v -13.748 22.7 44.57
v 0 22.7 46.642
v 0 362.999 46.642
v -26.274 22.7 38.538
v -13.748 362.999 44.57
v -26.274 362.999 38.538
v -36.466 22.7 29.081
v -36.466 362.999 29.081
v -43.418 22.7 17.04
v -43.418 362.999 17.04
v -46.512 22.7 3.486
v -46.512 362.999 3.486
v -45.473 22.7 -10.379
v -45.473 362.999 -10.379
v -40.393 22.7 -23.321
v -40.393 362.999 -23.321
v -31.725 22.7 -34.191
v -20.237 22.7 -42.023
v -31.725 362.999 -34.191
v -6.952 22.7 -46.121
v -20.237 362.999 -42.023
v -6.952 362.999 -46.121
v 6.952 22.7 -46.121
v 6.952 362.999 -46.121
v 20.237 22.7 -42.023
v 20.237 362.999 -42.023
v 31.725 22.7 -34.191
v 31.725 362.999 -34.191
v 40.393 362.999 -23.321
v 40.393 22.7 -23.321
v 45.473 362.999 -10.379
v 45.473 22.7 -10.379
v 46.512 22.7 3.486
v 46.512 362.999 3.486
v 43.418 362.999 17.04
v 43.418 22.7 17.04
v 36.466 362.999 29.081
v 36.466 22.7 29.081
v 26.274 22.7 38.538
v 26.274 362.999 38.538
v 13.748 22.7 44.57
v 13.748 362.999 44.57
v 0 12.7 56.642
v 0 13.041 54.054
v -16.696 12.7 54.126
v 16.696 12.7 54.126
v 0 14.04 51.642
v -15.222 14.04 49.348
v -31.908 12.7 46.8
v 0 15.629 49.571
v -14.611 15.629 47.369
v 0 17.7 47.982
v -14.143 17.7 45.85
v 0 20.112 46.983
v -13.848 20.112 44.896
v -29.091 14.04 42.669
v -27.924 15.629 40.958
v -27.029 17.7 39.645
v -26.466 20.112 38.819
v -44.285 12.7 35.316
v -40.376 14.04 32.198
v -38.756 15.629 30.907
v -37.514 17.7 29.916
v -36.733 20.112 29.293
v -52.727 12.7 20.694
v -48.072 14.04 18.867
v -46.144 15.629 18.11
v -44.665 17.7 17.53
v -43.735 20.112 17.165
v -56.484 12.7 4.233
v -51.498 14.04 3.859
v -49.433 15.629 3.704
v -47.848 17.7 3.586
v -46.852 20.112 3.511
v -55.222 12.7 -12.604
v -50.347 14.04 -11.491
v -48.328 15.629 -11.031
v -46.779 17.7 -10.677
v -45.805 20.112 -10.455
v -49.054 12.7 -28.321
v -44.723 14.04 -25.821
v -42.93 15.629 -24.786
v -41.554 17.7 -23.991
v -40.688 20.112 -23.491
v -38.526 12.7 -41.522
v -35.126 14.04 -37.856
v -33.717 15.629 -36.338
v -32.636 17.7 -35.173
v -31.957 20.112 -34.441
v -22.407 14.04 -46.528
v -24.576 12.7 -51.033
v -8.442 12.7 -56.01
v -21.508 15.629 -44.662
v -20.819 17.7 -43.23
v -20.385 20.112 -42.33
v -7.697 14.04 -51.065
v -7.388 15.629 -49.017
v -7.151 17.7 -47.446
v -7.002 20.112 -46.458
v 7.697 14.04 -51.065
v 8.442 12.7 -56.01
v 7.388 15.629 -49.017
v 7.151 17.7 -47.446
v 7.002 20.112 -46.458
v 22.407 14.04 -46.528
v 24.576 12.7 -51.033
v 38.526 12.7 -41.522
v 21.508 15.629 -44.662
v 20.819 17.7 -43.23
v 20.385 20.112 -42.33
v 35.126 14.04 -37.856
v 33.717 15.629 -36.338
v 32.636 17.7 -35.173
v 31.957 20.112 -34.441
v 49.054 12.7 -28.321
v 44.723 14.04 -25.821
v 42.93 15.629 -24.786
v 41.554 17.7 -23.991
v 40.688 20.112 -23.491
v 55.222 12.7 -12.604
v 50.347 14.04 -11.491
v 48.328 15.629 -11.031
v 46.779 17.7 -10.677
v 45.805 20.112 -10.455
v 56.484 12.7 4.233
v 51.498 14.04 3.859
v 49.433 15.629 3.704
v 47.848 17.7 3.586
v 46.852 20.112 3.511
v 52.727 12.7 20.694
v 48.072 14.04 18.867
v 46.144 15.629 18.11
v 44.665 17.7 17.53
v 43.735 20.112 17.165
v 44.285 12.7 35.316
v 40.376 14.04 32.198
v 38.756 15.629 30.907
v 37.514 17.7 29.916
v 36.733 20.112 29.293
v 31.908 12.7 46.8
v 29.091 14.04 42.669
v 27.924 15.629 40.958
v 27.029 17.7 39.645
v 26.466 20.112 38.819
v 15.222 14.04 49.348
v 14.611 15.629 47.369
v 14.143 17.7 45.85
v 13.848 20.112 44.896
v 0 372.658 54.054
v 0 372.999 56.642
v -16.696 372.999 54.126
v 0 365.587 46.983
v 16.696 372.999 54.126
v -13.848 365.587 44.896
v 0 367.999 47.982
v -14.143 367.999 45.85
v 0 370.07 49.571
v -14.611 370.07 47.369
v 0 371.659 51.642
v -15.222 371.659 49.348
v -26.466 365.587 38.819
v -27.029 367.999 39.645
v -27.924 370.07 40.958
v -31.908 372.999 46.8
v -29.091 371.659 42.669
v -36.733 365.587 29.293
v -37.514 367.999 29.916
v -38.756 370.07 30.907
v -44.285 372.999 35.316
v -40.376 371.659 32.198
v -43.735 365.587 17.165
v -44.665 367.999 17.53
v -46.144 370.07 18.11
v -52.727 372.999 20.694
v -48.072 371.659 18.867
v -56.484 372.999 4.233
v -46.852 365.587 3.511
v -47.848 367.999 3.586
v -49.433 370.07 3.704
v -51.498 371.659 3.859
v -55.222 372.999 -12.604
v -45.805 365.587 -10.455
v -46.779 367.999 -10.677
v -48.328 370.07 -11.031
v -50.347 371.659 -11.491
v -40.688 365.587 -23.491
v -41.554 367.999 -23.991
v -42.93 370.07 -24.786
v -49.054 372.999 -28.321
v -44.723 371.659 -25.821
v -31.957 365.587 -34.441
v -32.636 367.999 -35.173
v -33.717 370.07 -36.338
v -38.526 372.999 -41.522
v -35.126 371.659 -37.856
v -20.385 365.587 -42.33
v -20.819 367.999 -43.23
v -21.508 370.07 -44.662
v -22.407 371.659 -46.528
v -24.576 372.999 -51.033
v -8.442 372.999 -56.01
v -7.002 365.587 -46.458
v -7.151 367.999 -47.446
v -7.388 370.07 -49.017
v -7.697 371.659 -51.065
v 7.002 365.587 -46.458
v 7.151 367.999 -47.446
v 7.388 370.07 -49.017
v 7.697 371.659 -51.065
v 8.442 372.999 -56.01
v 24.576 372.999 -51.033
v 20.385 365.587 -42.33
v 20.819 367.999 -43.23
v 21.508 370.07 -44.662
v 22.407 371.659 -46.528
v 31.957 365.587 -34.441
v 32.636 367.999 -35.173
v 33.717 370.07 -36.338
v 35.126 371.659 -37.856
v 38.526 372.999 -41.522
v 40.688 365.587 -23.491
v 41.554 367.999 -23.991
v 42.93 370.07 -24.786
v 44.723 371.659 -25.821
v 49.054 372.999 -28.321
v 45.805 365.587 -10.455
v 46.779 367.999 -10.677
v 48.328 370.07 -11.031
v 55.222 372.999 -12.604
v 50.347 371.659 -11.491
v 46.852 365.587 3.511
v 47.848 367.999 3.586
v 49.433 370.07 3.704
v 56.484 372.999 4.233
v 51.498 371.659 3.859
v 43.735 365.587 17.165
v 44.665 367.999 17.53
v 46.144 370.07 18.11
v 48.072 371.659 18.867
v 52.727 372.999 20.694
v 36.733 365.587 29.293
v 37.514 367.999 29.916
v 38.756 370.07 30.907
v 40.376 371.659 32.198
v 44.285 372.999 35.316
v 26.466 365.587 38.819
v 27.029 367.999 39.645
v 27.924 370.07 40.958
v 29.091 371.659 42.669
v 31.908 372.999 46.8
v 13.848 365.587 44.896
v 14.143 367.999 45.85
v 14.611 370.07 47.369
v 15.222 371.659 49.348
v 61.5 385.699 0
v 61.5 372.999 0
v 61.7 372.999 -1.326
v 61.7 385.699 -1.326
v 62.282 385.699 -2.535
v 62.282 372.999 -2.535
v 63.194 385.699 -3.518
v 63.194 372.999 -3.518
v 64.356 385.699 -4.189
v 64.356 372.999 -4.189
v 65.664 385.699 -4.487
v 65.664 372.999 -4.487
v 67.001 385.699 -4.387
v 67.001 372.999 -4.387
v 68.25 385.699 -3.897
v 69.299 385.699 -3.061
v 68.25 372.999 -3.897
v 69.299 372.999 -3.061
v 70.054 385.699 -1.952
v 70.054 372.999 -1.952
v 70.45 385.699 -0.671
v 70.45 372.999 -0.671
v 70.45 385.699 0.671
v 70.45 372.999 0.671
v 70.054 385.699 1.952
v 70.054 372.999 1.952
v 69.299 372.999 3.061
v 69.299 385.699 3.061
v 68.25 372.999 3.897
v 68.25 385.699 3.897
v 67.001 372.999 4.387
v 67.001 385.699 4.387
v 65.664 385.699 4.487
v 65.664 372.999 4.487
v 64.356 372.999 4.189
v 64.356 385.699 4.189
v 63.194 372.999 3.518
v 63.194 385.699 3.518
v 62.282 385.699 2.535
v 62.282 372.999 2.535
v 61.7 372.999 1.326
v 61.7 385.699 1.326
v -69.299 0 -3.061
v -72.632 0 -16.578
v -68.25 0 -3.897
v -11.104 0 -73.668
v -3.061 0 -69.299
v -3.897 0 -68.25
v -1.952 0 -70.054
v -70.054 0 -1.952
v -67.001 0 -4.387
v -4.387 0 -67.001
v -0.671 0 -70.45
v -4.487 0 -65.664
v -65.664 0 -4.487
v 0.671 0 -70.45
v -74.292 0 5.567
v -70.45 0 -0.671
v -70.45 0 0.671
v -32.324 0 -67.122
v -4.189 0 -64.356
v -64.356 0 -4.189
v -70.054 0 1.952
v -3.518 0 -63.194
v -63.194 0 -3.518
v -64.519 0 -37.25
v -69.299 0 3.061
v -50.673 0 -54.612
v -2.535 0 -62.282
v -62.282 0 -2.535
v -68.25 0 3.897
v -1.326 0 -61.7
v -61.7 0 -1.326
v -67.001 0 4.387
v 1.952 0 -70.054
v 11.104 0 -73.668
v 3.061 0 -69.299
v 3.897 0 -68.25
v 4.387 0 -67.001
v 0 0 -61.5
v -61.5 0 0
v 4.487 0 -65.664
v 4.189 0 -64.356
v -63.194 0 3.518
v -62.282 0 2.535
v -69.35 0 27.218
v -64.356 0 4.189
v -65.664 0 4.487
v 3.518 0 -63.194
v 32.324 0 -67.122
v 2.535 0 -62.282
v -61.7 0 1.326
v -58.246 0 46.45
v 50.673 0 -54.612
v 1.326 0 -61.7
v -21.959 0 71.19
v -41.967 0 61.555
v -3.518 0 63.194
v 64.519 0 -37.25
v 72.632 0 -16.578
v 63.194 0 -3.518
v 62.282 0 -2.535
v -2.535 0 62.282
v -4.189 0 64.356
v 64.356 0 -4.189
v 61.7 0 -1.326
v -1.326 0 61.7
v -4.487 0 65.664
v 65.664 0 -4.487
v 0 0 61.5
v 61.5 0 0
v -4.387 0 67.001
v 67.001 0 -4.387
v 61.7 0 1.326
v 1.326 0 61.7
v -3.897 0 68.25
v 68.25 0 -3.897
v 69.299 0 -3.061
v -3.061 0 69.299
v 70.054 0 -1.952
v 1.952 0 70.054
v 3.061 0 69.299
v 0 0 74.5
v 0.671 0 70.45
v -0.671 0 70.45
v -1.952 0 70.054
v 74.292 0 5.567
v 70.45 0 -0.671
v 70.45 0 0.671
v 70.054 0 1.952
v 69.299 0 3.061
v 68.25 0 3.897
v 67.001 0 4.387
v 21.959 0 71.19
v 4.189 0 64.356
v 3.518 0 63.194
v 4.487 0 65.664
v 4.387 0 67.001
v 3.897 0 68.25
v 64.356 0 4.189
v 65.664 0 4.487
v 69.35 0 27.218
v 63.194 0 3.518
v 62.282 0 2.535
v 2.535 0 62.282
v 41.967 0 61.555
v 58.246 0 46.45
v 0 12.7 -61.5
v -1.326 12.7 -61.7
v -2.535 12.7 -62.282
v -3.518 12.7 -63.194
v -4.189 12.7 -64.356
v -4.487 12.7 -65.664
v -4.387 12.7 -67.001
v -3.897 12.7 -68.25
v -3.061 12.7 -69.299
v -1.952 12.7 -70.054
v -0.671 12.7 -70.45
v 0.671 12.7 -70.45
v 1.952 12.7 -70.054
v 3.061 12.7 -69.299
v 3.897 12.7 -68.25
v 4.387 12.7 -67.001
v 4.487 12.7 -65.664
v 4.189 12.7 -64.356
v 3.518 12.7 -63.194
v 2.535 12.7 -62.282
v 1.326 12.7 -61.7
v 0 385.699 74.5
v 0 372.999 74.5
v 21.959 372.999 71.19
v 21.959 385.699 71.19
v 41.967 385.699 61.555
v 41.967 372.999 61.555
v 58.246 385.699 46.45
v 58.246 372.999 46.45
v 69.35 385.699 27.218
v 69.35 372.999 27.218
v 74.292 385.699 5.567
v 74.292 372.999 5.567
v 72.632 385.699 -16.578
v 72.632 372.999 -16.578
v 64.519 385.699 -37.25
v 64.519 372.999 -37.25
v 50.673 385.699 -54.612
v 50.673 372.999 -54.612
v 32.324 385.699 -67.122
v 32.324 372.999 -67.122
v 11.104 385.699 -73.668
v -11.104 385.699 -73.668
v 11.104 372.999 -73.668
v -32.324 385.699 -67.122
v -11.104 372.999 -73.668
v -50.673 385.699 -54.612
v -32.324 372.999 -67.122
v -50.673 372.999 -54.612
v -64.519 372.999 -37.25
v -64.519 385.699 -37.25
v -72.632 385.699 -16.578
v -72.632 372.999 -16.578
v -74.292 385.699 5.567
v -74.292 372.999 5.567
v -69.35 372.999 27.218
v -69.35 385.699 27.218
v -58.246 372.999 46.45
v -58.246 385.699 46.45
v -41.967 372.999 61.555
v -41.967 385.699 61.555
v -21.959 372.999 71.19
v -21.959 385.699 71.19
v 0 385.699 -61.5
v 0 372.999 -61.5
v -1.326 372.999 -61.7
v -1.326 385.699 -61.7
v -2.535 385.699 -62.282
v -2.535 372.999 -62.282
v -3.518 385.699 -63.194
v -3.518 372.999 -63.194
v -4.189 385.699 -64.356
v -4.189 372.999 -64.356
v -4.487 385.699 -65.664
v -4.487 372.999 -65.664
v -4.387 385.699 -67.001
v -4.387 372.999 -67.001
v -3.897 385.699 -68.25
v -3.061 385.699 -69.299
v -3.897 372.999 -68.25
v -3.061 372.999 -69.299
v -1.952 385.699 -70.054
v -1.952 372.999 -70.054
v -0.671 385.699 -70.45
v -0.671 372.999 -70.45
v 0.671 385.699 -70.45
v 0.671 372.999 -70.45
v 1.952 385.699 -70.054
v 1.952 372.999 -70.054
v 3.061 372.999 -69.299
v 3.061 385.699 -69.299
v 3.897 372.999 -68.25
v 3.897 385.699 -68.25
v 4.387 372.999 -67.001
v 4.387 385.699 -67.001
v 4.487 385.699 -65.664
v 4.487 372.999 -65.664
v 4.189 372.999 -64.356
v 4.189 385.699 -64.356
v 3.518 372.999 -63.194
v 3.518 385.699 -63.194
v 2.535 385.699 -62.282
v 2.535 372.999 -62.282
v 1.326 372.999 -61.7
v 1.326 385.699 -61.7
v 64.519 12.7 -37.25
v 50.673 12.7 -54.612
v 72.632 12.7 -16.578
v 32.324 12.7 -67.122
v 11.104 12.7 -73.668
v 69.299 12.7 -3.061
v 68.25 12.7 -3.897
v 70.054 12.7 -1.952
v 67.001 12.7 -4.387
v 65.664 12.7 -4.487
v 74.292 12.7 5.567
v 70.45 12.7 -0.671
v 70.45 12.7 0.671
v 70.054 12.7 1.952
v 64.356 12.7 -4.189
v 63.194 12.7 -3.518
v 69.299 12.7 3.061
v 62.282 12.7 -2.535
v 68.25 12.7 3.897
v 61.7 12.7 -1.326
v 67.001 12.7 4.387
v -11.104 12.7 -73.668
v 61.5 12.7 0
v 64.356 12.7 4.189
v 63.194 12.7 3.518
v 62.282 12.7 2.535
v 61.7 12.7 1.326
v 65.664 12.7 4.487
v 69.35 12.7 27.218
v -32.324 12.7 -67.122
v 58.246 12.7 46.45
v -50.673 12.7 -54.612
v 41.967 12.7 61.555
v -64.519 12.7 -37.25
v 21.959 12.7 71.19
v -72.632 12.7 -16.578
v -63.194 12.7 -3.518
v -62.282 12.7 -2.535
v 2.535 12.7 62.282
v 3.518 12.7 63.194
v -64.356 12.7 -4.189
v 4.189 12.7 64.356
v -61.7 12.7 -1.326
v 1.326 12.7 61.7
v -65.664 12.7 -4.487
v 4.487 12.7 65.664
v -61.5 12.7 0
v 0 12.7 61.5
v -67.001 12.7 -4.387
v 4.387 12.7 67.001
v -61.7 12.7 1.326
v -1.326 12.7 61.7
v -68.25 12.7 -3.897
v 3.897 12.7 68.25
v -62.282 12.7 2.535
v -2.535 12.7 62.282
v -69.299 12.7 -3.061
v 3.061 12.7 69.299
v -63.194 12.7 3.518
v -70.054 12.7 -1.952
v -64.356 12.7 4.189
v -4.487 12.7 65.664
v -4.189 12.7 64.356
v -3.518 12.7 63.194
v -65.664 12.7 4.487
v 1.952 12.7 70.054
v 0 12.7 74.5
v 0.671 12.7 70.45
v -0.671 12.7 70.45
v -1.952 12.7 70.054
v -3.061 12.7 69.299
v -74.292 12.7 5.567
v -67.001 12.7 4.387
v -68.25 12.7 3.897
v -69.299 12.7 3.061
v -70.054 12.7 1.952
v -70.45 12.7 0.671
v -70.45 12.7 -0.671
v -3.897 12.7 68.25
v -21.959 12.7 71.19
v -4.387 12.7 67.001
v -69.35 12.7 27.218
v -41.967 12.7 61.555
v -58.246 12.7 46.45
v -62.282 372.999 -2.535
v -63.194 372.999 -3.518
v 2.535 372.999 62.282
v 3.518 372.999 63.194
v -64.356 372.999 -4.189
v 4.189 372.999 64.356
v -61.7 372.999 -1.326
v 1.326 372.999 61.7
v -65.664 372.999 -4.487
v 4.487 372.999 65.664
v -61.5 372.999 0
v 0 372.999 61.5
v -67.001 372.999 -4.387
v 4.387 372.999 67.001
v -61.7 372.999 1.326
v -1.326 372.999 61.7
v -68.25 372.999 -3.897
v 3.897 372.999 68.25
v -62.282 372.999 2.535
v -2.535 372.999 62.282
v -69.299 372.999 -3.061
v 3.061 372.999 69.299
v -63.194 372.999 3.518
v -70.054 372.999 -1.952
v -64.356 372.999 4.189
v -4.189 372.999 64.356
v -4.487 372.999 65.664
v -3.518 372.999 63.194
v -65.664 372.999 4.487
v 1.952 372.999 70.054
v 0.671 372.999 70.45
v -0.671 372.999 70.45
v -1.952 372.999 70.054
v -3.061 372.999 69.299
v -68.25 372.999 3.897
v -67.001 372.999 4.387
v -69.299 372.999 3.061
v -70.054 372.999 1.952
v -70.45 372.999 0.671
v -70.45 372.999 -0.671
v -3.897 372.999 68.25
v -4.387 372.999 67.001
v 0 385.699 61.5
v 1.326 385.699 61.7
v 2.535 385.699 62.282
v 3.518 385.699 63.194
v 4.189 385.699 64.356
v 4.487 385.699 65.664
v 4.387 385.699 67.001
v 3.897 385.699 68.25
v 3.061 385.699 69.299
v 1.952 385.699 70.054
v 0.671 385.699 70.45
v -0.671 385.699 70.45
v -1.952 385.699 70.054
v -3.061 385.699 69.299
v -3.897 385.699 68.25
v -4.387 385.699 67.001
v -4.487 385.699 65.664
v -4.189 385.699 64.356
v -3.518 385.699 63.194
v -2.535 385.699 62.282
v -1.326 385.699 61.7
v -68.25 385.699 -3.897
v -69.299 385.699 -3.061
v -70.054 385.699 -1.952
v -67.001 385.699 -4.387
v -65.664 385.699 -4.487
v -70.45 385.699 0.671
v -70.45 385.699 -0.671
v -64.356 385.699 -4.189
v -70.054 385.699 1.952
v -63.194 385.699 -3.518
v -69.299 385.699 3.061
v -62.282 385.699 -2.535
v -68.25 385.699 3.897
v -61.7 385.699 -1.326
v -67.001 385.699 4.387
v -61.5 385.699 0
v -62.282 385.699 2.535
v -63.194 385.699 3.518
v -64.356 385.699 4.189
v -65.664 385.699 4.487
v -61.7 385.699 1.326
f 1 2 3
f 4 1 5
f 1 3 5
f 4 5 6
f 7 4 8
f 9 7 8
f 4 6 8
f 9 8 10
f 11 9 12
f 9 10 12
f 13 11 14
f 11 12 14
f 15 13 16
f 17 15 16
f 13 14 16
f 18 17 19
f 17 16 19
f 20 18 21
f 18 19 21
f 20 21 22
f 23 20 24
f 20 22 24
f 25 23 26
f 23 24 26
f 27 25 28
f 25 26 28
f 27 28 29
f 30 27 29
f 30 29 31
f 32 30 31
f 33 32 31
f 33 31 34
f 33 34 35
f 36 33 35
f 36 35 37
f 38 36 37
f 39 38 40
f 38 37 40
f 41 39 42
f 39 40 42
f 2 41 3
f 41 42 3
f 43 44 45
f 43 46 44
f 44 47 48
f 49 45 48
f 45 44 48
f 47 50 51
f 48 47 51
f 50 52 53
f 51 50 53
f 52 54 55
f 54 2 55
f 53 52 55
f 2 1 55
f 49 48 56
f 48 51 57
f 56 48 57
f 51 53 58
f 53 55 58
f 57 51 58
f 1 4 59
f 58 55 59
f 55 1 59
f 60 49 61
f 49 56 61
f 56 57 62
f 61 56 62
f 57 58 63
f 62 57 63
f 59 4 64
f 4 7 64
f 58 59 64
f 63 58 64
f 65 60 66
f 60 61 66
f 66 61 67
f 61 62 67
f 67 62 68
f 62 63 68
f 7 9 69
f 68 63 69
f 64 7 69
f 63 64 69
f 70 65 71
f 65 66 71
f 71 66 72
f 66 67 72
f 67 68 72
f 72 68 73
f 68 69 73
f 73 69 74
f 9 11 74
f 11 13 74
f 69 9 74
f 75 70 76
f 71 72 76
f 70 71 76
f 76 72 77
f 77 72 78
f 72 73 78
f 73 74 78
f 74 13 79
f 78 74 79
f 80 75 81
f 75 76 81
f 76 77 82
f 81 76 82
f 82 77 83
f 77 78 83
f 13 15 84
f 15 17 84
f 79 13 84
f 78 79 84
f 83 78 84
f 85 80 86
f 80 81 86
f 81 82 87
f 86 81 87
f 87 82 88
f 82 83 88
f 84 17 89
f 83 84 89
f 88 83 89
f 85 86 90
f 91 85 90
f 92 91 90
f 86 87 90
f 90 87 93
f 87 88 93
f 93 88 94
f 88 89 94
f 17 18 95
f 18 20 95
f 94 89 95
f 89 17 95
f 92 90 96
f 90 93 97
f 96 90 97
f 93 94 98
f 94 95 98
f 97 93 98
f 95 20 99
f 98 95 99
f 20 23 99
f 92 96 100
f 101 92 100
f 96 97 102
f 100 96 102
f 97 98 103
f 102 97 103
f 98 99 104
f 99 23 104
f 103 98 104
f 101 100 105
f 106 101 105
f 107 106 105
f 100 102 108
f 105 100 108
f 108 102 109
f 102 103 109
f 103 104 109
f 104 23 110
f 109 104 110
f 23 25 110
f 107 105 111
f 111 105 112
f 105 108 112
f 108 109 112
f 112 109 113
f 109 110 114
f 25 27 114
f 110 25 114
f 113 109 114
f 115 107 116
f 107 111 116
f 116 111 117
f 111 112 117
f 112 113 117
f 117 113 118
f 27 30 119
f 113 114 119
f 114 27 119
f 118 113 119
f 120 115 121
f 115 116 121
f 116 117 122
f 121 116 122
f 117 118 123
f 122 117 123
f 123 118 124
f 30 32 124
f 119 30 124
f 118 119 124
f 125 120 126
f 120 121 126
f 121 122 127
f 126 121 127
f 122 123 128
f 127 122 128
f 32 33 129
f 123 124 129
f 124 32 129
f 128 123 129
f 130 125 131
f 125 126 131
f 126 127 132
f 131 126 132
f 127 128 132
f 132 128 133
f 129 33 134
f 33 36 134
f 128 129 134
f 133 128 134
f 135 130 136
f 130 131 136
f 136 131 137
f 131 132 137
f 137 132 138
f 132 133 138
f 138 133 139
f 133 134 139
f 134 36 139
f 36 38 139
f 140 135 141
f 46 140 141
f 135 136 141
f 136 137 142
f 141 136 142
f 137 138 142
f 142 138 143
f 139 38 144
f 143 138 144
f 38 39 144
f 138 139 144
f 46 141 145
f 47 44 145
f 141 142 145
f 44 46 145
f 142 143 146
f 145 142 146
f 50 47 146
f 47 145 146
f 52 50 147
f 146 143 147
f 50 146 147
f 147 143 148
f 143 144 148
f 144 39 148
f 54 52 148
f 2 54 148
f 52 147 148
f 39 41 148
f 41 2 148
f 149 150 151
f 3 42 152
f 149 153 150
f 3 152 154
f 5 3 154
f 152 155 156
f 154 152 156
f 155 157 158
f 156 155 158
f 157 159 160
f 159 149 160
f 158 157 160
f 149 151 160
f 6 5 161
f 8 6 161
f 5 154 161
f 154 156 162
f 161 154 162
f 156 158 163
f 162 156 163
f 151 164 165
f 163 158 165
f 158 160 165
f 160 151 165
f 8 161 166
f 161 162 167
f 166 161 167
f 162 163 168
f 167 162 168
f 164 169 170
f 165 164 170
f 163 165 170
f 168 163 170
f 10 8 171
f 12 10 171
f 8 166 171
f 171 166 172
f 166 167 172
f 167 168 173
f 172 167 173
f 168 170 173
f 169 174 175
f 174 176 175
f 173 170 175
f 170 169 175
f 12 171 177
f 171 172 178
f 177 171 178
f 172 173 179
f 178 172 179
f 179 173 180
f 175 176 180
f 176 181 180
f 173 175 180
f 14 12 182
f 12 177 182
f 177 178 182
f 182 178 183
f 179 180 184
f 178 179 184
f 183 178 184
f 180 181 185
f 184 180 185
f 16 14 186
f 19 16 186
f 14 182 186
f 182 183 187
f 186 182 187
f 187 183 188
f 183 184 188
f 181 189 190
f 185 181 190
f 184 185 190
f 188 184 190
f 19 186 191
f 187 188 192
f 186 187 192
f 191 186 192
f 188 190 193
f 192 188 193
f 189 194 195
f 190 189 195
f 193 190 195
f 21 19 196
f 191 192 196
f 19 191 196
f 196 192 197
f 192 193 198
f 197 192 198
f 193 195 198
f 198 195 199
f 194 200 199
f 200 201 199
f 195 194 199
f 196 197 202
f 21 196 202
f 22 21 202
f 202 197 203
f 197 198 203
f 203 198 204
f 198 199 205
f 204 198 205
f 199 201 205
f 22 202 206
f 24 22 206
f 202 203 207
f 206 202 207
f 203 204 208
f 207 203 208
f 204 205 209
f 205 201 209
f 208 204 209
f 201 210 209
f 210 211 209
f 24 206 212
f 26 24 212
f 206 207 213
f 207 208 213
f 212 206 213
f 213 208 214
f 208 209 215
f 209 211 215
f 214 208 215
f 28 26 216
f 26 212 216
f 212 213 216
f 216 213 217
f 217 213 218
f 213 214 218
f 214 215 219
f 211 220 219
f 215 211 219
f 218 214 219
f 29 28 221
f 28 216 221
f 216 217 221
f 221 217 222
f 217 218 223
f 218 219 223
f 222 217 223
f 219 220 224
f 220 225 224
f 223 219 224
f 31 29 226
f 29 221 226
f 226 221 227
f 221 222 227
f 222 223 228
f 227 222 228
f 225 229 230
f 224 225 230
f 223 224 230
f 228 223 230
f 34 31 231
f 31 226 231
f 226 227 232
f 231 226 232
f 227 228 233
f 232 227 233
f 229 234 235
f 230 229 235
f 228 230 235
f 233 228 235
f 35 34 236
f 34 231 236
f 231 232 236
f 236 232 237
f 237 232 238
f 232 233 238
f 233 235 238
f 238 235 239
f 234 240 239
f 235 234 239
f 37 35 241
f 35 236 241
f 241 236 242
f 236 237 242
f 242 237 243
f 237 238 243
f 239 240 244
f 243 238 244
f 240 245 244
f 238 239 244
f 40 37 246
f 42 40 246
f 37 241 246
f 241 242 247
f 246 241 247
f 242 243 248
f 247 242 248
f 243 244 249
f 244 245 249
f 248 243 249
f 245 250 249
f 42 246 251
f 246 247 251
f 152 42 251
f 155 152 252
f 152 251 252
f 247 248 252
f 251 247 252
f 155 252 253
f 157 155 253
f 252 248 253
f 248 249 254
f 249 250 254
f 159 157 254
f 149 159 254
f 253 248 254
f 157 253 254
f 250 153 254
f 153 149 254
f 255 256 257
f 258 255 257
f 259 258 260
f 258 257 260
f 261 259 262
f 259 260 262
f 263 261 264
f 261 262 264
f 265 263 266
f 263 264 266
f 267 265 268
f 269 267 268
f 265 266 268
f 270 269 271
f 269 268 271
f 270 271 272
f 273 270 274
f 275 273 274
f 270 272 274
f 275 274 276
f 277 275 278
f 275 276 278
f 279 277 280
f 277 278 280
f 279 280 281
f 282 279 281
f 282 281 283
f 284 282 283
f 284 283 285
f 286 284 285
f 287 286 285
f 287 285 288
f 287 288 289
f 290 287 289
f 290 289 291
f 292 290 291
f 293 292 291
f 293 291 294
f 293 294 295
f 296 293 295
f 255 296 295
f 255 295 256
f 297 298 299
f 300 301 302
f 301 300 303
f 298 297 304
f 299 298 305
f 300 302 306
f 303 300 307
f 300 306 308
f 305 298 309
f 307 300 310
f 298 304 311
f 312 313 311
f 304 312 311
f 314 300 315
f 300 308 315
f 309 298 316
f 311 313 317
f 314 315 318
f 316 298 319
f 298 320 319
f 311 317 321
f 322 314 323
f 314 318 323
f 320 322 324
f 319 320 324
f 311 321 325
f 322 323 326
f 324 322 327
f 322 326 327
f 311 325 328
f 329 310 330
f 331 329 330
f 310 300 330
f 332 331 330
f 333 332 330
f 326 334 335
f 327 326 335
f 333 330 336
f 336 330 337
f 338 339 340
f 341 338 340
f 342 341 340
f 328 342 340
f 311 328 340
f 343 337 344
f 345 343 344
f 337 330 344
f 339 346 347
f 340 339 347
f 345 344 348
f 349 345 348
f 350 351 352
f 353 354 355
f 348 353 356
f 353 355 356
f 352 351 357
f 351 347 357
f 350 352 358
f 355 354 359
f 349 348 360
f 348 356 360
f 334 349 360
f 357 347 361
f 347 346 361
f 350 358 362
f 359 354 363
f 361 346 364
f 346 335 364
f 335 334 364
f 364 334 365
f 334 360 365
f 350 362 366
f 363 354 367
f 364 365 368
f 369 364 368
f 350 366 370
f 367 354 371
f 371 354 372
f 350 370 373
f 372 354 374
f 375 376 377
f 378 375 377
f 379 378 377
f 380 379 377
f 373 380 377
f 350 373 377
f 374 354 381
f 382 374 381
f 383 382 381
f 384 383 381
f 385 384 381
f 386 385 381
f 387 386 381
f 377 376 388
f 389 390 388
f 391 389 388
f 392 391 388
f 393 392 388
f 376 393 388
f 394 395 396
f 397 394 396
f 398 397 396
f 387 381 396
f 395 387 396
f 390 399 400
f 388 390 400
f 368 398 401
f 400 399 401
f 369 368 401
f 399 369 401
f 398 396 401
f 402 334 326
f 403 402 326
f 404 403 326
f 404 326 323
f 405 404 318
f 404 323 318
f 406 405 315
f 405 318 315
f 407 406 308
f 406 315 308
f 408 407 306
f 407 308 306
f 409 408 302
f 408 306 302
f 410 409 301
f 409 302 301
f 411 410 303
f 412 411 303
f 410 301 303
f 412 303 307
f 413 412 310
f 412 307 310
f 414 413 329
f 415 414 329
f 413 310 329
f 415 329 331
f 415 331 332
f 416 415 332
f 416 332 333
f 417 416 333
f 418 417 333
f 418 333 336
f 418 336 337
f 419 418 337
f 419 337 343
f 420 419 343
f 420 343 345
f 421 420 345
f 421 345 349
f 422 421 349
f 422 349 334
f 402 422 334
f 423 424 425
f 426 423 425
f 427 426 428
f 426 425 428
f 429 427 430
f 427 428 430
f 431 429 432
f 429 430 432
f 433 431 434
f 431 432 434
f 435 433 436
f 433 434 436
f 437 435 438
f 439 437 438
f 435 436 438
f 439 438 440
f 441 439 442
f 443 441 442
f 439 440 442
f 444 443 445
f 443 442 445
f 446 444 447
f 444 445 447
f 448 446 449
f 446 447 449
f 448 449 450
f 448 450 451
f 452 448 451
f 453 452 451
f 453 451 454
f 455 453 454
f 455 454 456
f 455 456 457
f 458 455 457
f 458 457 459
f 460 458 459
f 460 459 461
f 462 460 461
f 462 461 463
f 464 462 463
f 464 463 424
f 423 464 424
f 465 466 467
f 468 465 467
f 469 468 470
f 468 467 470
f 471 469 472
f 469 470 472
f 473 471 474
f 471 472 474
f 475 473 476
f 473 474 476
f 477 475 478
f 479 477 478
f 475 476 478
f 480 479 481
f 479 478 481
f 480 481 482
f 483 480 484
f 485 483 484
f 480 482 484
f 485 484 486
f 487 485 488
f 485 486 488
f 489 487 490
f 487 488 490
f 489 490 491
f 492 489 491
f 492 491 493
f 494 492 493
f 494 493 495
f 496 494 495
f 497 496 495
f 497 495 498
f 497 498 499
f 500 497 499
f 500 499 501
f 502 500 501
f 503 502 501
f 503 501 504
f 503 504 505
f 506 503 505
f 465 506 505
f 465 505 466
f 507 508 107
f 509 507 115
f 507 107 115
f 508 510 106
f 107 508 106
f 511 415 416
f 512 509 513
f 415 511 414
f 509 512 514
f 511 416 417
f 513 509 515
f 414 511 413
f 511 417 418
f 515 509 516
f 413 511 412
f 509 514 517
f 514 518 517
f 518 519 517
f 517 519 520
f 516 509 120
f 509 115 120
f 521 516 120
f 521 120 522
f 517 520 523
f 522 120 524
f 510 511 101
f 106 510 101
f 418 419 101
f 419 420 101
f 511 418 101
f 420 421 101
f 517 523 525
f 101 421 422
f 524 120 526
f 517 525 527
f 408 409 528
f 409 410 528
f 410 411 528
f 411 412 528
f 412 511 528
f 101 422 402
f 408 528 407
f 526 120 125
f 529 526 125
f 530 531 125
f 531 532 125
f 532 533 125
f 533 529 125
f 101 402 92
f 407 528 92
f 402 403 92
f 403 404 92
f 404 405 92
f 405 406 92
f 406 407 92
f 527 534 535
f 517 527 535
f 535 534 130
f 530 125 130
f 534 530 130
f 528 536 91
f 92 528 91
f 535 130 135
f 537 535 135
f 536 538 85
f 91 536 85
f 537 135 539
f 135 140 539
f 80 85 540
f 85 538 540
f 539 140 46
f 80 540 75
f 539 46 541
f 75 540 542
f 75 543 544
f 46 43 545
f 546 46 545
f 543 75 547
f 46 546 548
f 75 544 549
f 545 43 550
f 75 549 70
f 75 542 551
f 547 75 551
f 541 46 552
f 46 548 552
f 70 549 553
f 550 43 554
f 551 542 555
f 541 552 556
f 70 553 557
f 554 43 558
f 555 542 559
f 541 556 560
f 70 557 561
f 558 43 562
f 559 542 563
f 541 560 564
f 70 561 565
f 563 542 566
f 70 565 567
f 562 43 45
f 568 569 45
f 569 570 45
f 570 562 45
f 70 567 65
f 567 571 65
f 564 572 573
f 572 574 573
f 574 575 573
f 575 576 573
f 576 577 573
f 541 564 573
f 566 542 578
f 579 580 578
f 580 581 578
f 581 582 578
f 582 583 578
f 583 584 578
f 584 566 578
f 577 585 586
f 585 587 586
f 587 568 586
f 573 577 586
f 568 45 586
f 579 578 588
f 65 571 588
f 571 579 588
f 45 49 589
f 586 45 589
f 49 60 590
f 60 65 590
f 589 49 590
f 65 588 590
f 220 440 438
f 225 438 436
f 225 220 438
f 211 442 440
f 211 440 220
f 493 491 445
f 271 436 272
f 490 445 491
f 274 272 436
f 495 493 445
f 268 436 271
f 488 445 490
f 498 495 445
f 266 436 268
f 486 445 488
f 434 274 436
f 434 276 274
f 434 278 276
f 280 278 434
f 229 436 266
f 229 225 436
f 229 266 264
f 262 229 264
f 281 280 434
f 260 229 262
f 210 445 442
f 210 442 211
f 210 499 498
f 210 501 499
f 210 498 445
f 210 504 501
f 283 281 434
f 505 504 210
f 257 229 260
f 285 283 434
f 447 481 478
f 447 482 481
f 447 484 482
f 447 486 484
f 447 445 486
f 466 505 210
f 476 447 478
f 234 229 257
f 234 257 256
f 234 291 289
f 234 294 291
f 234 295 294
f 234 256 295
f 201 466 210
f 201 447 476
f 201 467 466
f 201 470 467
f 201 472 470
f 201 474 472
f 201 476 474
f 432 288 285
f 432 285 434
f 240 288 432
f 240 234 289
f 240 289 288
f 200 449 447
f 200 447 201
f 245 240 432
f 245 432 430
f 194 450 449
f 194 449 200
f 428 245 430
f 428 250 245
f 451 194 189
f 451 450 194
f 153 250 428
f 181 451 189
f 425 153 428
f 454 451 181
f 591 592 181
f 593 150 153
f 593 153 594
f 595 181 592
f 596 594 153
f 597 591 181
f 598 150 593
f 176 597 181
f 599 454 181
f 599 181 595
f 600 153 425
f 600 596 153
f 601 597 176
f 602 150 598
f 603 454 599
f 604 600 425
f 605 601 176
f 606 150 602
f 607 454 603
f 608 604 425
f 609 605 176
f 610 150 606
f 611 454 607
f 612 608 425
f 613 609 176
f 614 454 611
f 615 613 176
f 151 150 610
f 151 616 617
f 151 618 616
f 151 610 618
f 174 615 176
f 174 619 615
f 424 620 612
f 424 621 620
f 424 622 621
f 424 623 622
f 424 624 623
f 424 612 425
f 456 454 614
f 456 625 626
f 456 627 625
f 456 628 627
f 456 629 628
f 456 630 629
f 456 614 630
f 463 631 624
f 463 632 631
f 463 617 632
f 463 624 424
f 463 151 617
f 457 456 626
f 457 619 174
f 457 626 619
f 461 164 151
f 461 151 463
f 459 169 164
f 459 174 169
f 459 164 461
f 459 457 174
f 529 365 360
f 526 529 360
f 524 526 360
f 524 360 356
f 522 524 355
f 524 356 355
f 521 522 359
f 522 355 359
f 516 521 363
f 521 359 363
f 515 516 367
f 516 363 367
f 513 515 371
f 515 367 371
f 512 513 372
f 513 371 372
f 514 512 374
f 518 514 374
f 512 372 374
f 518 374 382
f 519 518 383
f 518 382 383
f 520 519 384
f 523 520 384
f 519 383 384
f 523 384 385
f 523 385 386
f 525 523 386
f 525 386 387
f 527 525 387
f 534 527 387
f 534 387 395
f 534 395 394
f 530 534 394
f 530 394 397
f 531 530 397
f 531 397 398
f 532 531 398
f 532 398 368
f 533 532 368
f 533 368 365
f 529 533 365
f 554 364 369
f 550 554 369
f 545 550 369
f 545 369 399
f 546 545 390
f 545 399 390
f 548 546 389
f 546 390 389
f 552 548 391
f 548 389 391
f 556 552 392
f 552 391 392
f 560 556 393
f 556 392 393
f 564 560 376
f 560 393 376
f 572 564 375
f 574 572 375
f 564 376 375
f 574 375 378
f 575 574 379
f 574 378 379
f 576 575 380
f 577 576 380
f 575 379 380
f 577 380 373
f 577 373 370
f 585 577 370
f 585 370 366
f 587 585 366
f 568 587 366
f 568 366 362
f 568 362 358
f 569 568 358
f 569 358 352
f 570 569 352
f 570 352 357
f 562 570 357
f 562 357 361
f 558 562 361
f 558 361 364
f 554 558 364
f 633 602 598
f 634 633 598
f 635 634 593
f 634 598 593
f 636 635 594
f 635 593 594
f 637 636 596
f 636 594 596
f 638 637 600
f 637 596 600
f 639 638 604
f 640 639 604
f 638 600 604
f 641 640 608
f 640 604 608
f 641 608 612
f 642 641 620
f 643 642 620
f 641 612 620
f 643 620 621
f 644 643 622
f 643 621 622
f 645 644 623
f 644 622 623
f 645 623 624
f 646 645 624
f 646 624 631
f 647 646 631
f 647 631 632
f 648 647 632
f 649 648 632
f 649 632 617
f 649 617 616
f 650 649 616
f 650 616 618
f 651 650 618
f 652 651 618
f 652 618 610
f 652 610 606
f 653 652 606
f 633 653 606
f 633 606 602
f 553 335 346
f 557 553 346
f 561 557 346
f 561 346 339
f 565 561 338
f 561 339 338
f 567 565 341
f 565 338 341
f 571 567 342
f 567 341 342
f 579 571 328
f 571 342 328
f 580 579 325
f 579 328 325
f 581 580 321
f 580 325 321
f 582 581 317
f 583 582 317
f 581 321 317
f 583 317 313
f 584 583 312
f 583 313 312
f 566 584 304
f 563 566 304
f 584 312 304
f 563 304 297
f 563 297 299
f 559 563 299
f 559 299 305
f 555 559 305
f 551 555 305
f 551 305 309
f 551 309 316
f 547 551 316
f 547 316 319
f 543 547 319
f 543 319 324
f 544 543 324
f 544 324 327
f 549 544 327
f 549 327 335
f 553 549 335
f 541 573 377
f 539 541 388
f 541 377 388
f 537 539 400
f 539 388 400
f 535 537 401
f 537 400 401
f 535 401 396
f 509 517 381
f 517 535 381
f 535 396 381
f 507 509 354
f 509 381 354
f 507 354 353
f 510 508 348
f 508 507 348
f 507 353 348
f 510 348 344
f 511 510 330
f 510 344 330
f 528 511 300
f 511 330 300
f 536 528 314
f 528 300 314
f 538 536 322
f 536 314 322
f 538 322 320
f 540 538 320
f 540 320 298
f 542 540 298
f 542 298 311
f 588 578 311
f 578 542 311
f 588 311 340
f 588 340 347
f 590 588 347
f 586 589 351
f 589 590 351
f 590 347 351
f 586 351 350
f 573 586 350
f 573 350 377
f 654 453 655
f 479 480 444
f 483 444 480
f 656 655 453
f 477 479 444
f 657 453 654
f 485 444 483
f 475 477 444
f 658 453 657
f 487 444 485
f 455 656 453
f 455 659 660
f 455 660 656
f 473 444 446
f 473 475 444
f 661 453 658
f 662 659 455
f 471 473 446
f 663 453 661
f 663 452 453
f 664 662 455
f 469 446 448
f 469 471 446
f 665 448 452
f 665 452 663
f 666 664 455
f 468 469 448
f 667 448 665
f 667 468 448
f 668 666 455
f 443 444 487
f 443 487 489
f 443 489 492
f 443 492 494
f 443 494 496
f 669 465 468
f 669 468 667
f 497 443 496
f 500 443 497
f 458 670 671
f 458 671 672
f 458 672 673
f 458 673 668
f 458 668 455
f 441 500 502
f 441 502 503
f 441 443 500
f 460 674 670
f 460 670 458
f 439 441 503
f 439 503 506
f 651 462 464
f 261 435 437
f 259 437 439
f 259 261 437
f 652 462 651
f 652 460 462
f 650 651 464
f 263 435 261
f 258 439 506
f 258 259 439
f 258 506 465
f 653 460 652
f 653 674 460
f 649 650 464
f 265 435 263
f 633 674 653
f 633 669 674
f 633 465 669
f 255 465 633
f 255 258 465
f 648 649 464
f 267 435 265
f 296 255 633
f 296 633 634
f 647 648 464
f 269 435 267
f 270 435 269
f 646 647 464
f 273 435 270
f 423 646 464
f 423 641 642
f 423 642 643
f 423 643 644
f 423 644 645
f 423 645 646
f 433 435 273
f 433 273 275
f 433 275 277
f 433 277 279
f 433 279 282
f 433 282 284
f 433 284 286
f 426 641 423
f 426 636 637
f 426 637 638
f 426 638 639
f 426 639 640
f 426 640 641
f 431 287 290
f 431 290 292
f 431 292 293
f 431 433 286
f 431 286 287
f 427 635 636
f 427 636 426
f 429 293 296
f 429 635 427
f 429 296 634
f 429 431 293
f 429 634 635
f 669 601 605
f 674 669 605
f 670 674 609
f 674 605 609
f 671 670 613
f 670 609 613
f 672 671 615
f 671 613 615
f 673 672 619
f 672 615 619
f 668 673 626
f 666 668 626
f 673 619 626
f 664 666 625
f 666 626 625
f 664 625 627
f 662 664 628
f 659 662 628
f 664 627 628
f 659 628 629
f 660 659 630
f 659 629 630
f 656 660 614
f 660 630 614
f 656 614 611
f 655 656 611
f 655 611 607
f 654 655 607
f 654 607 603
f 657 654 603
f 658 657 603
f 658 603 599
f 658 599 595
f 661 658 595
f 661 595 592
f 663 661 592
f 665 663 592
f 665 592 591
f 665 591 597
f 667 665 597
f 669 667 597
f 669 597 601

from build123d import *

# Parameters (mm, degrees)
SKETCH1_R           = 74.5
BOSS_EXTRUDE1_DEPTH = 385.699
SKETCH2_W           = 27.8577878
SKETCH2_H           = 360.299
SKETCH3_R           = 4.499991
CUT_EXTRUDE1_DEPTH  = 400.830237227
CIRPATTERN1_COUNT   = 4
FILLET1_R           = 10


with BuildPart() as part:
    # Sketch1 → Boss-Extrude1 (new body)
    with BuildSketch(Plane(origin=(0, 0, 0), x_dir=(1, 0, 0), z_dir=(0, 1, 0))):
        with Locations(Location((0, 0, 0), (0, 0, 270))):
            Circle(SKETCH1_R)
    extrude(amount=BOSS_EXTRUDE1_DEPTH)

    # Sketch2 → Cut-Revolve4 (revolve, cut)
    with BuildSketch(Plane.XY, mode=Mode.PRIVATE) as cut_revolve4_sk:
        with Locations((-60.5711061, 192.8495)):
            Rectangle(SKETCH2_W, SKETCH2_H)
    revolve(cut_revolve4_sk.sketch.rotate(Axis((0, 385.699, 0), (0, -1, 0)), 270), axis=Axis((0, 385.699, 0), (0, -1, 0)), mode=Mode.SUBTRACT)

    # Sketch3 → Cut-Extrude1 (cut, through all)
    with BuildSketch(Plane.XZ):
        with Locations(Location((0, 66.000122, 0), (0, 0, 270))):
            Circle(SKETCH3_R)
    cut_extrude1 = extrude(amount=-CUT_EXTRUDE1_DEPTH, mode=Mode.SUBTRACT)

    # CirPattern1: Cut-Extrude1 ×4 about axis
    cirpattern1_axis = Axis((0, 0, 0), (0, 1, 0))
    for i in range(1, CIRPATTERN1_COUNT):
        add(cut_extrude1.rotate(cirpattern1_axis, i * 360 / CIRPATTERN1_COUNT), mode=Mode.SUBTRACT)

    # Fillet1
    fillet1_edges = [part.edges().sort_by_distance(p)[0] for p in [
        (0, 12.7, -46.6422122),
        (0, 372.999, -46.6422122),
    ]]
    fillet(fillet1_edges, radius=FILLET1_R)


solid = part.part
